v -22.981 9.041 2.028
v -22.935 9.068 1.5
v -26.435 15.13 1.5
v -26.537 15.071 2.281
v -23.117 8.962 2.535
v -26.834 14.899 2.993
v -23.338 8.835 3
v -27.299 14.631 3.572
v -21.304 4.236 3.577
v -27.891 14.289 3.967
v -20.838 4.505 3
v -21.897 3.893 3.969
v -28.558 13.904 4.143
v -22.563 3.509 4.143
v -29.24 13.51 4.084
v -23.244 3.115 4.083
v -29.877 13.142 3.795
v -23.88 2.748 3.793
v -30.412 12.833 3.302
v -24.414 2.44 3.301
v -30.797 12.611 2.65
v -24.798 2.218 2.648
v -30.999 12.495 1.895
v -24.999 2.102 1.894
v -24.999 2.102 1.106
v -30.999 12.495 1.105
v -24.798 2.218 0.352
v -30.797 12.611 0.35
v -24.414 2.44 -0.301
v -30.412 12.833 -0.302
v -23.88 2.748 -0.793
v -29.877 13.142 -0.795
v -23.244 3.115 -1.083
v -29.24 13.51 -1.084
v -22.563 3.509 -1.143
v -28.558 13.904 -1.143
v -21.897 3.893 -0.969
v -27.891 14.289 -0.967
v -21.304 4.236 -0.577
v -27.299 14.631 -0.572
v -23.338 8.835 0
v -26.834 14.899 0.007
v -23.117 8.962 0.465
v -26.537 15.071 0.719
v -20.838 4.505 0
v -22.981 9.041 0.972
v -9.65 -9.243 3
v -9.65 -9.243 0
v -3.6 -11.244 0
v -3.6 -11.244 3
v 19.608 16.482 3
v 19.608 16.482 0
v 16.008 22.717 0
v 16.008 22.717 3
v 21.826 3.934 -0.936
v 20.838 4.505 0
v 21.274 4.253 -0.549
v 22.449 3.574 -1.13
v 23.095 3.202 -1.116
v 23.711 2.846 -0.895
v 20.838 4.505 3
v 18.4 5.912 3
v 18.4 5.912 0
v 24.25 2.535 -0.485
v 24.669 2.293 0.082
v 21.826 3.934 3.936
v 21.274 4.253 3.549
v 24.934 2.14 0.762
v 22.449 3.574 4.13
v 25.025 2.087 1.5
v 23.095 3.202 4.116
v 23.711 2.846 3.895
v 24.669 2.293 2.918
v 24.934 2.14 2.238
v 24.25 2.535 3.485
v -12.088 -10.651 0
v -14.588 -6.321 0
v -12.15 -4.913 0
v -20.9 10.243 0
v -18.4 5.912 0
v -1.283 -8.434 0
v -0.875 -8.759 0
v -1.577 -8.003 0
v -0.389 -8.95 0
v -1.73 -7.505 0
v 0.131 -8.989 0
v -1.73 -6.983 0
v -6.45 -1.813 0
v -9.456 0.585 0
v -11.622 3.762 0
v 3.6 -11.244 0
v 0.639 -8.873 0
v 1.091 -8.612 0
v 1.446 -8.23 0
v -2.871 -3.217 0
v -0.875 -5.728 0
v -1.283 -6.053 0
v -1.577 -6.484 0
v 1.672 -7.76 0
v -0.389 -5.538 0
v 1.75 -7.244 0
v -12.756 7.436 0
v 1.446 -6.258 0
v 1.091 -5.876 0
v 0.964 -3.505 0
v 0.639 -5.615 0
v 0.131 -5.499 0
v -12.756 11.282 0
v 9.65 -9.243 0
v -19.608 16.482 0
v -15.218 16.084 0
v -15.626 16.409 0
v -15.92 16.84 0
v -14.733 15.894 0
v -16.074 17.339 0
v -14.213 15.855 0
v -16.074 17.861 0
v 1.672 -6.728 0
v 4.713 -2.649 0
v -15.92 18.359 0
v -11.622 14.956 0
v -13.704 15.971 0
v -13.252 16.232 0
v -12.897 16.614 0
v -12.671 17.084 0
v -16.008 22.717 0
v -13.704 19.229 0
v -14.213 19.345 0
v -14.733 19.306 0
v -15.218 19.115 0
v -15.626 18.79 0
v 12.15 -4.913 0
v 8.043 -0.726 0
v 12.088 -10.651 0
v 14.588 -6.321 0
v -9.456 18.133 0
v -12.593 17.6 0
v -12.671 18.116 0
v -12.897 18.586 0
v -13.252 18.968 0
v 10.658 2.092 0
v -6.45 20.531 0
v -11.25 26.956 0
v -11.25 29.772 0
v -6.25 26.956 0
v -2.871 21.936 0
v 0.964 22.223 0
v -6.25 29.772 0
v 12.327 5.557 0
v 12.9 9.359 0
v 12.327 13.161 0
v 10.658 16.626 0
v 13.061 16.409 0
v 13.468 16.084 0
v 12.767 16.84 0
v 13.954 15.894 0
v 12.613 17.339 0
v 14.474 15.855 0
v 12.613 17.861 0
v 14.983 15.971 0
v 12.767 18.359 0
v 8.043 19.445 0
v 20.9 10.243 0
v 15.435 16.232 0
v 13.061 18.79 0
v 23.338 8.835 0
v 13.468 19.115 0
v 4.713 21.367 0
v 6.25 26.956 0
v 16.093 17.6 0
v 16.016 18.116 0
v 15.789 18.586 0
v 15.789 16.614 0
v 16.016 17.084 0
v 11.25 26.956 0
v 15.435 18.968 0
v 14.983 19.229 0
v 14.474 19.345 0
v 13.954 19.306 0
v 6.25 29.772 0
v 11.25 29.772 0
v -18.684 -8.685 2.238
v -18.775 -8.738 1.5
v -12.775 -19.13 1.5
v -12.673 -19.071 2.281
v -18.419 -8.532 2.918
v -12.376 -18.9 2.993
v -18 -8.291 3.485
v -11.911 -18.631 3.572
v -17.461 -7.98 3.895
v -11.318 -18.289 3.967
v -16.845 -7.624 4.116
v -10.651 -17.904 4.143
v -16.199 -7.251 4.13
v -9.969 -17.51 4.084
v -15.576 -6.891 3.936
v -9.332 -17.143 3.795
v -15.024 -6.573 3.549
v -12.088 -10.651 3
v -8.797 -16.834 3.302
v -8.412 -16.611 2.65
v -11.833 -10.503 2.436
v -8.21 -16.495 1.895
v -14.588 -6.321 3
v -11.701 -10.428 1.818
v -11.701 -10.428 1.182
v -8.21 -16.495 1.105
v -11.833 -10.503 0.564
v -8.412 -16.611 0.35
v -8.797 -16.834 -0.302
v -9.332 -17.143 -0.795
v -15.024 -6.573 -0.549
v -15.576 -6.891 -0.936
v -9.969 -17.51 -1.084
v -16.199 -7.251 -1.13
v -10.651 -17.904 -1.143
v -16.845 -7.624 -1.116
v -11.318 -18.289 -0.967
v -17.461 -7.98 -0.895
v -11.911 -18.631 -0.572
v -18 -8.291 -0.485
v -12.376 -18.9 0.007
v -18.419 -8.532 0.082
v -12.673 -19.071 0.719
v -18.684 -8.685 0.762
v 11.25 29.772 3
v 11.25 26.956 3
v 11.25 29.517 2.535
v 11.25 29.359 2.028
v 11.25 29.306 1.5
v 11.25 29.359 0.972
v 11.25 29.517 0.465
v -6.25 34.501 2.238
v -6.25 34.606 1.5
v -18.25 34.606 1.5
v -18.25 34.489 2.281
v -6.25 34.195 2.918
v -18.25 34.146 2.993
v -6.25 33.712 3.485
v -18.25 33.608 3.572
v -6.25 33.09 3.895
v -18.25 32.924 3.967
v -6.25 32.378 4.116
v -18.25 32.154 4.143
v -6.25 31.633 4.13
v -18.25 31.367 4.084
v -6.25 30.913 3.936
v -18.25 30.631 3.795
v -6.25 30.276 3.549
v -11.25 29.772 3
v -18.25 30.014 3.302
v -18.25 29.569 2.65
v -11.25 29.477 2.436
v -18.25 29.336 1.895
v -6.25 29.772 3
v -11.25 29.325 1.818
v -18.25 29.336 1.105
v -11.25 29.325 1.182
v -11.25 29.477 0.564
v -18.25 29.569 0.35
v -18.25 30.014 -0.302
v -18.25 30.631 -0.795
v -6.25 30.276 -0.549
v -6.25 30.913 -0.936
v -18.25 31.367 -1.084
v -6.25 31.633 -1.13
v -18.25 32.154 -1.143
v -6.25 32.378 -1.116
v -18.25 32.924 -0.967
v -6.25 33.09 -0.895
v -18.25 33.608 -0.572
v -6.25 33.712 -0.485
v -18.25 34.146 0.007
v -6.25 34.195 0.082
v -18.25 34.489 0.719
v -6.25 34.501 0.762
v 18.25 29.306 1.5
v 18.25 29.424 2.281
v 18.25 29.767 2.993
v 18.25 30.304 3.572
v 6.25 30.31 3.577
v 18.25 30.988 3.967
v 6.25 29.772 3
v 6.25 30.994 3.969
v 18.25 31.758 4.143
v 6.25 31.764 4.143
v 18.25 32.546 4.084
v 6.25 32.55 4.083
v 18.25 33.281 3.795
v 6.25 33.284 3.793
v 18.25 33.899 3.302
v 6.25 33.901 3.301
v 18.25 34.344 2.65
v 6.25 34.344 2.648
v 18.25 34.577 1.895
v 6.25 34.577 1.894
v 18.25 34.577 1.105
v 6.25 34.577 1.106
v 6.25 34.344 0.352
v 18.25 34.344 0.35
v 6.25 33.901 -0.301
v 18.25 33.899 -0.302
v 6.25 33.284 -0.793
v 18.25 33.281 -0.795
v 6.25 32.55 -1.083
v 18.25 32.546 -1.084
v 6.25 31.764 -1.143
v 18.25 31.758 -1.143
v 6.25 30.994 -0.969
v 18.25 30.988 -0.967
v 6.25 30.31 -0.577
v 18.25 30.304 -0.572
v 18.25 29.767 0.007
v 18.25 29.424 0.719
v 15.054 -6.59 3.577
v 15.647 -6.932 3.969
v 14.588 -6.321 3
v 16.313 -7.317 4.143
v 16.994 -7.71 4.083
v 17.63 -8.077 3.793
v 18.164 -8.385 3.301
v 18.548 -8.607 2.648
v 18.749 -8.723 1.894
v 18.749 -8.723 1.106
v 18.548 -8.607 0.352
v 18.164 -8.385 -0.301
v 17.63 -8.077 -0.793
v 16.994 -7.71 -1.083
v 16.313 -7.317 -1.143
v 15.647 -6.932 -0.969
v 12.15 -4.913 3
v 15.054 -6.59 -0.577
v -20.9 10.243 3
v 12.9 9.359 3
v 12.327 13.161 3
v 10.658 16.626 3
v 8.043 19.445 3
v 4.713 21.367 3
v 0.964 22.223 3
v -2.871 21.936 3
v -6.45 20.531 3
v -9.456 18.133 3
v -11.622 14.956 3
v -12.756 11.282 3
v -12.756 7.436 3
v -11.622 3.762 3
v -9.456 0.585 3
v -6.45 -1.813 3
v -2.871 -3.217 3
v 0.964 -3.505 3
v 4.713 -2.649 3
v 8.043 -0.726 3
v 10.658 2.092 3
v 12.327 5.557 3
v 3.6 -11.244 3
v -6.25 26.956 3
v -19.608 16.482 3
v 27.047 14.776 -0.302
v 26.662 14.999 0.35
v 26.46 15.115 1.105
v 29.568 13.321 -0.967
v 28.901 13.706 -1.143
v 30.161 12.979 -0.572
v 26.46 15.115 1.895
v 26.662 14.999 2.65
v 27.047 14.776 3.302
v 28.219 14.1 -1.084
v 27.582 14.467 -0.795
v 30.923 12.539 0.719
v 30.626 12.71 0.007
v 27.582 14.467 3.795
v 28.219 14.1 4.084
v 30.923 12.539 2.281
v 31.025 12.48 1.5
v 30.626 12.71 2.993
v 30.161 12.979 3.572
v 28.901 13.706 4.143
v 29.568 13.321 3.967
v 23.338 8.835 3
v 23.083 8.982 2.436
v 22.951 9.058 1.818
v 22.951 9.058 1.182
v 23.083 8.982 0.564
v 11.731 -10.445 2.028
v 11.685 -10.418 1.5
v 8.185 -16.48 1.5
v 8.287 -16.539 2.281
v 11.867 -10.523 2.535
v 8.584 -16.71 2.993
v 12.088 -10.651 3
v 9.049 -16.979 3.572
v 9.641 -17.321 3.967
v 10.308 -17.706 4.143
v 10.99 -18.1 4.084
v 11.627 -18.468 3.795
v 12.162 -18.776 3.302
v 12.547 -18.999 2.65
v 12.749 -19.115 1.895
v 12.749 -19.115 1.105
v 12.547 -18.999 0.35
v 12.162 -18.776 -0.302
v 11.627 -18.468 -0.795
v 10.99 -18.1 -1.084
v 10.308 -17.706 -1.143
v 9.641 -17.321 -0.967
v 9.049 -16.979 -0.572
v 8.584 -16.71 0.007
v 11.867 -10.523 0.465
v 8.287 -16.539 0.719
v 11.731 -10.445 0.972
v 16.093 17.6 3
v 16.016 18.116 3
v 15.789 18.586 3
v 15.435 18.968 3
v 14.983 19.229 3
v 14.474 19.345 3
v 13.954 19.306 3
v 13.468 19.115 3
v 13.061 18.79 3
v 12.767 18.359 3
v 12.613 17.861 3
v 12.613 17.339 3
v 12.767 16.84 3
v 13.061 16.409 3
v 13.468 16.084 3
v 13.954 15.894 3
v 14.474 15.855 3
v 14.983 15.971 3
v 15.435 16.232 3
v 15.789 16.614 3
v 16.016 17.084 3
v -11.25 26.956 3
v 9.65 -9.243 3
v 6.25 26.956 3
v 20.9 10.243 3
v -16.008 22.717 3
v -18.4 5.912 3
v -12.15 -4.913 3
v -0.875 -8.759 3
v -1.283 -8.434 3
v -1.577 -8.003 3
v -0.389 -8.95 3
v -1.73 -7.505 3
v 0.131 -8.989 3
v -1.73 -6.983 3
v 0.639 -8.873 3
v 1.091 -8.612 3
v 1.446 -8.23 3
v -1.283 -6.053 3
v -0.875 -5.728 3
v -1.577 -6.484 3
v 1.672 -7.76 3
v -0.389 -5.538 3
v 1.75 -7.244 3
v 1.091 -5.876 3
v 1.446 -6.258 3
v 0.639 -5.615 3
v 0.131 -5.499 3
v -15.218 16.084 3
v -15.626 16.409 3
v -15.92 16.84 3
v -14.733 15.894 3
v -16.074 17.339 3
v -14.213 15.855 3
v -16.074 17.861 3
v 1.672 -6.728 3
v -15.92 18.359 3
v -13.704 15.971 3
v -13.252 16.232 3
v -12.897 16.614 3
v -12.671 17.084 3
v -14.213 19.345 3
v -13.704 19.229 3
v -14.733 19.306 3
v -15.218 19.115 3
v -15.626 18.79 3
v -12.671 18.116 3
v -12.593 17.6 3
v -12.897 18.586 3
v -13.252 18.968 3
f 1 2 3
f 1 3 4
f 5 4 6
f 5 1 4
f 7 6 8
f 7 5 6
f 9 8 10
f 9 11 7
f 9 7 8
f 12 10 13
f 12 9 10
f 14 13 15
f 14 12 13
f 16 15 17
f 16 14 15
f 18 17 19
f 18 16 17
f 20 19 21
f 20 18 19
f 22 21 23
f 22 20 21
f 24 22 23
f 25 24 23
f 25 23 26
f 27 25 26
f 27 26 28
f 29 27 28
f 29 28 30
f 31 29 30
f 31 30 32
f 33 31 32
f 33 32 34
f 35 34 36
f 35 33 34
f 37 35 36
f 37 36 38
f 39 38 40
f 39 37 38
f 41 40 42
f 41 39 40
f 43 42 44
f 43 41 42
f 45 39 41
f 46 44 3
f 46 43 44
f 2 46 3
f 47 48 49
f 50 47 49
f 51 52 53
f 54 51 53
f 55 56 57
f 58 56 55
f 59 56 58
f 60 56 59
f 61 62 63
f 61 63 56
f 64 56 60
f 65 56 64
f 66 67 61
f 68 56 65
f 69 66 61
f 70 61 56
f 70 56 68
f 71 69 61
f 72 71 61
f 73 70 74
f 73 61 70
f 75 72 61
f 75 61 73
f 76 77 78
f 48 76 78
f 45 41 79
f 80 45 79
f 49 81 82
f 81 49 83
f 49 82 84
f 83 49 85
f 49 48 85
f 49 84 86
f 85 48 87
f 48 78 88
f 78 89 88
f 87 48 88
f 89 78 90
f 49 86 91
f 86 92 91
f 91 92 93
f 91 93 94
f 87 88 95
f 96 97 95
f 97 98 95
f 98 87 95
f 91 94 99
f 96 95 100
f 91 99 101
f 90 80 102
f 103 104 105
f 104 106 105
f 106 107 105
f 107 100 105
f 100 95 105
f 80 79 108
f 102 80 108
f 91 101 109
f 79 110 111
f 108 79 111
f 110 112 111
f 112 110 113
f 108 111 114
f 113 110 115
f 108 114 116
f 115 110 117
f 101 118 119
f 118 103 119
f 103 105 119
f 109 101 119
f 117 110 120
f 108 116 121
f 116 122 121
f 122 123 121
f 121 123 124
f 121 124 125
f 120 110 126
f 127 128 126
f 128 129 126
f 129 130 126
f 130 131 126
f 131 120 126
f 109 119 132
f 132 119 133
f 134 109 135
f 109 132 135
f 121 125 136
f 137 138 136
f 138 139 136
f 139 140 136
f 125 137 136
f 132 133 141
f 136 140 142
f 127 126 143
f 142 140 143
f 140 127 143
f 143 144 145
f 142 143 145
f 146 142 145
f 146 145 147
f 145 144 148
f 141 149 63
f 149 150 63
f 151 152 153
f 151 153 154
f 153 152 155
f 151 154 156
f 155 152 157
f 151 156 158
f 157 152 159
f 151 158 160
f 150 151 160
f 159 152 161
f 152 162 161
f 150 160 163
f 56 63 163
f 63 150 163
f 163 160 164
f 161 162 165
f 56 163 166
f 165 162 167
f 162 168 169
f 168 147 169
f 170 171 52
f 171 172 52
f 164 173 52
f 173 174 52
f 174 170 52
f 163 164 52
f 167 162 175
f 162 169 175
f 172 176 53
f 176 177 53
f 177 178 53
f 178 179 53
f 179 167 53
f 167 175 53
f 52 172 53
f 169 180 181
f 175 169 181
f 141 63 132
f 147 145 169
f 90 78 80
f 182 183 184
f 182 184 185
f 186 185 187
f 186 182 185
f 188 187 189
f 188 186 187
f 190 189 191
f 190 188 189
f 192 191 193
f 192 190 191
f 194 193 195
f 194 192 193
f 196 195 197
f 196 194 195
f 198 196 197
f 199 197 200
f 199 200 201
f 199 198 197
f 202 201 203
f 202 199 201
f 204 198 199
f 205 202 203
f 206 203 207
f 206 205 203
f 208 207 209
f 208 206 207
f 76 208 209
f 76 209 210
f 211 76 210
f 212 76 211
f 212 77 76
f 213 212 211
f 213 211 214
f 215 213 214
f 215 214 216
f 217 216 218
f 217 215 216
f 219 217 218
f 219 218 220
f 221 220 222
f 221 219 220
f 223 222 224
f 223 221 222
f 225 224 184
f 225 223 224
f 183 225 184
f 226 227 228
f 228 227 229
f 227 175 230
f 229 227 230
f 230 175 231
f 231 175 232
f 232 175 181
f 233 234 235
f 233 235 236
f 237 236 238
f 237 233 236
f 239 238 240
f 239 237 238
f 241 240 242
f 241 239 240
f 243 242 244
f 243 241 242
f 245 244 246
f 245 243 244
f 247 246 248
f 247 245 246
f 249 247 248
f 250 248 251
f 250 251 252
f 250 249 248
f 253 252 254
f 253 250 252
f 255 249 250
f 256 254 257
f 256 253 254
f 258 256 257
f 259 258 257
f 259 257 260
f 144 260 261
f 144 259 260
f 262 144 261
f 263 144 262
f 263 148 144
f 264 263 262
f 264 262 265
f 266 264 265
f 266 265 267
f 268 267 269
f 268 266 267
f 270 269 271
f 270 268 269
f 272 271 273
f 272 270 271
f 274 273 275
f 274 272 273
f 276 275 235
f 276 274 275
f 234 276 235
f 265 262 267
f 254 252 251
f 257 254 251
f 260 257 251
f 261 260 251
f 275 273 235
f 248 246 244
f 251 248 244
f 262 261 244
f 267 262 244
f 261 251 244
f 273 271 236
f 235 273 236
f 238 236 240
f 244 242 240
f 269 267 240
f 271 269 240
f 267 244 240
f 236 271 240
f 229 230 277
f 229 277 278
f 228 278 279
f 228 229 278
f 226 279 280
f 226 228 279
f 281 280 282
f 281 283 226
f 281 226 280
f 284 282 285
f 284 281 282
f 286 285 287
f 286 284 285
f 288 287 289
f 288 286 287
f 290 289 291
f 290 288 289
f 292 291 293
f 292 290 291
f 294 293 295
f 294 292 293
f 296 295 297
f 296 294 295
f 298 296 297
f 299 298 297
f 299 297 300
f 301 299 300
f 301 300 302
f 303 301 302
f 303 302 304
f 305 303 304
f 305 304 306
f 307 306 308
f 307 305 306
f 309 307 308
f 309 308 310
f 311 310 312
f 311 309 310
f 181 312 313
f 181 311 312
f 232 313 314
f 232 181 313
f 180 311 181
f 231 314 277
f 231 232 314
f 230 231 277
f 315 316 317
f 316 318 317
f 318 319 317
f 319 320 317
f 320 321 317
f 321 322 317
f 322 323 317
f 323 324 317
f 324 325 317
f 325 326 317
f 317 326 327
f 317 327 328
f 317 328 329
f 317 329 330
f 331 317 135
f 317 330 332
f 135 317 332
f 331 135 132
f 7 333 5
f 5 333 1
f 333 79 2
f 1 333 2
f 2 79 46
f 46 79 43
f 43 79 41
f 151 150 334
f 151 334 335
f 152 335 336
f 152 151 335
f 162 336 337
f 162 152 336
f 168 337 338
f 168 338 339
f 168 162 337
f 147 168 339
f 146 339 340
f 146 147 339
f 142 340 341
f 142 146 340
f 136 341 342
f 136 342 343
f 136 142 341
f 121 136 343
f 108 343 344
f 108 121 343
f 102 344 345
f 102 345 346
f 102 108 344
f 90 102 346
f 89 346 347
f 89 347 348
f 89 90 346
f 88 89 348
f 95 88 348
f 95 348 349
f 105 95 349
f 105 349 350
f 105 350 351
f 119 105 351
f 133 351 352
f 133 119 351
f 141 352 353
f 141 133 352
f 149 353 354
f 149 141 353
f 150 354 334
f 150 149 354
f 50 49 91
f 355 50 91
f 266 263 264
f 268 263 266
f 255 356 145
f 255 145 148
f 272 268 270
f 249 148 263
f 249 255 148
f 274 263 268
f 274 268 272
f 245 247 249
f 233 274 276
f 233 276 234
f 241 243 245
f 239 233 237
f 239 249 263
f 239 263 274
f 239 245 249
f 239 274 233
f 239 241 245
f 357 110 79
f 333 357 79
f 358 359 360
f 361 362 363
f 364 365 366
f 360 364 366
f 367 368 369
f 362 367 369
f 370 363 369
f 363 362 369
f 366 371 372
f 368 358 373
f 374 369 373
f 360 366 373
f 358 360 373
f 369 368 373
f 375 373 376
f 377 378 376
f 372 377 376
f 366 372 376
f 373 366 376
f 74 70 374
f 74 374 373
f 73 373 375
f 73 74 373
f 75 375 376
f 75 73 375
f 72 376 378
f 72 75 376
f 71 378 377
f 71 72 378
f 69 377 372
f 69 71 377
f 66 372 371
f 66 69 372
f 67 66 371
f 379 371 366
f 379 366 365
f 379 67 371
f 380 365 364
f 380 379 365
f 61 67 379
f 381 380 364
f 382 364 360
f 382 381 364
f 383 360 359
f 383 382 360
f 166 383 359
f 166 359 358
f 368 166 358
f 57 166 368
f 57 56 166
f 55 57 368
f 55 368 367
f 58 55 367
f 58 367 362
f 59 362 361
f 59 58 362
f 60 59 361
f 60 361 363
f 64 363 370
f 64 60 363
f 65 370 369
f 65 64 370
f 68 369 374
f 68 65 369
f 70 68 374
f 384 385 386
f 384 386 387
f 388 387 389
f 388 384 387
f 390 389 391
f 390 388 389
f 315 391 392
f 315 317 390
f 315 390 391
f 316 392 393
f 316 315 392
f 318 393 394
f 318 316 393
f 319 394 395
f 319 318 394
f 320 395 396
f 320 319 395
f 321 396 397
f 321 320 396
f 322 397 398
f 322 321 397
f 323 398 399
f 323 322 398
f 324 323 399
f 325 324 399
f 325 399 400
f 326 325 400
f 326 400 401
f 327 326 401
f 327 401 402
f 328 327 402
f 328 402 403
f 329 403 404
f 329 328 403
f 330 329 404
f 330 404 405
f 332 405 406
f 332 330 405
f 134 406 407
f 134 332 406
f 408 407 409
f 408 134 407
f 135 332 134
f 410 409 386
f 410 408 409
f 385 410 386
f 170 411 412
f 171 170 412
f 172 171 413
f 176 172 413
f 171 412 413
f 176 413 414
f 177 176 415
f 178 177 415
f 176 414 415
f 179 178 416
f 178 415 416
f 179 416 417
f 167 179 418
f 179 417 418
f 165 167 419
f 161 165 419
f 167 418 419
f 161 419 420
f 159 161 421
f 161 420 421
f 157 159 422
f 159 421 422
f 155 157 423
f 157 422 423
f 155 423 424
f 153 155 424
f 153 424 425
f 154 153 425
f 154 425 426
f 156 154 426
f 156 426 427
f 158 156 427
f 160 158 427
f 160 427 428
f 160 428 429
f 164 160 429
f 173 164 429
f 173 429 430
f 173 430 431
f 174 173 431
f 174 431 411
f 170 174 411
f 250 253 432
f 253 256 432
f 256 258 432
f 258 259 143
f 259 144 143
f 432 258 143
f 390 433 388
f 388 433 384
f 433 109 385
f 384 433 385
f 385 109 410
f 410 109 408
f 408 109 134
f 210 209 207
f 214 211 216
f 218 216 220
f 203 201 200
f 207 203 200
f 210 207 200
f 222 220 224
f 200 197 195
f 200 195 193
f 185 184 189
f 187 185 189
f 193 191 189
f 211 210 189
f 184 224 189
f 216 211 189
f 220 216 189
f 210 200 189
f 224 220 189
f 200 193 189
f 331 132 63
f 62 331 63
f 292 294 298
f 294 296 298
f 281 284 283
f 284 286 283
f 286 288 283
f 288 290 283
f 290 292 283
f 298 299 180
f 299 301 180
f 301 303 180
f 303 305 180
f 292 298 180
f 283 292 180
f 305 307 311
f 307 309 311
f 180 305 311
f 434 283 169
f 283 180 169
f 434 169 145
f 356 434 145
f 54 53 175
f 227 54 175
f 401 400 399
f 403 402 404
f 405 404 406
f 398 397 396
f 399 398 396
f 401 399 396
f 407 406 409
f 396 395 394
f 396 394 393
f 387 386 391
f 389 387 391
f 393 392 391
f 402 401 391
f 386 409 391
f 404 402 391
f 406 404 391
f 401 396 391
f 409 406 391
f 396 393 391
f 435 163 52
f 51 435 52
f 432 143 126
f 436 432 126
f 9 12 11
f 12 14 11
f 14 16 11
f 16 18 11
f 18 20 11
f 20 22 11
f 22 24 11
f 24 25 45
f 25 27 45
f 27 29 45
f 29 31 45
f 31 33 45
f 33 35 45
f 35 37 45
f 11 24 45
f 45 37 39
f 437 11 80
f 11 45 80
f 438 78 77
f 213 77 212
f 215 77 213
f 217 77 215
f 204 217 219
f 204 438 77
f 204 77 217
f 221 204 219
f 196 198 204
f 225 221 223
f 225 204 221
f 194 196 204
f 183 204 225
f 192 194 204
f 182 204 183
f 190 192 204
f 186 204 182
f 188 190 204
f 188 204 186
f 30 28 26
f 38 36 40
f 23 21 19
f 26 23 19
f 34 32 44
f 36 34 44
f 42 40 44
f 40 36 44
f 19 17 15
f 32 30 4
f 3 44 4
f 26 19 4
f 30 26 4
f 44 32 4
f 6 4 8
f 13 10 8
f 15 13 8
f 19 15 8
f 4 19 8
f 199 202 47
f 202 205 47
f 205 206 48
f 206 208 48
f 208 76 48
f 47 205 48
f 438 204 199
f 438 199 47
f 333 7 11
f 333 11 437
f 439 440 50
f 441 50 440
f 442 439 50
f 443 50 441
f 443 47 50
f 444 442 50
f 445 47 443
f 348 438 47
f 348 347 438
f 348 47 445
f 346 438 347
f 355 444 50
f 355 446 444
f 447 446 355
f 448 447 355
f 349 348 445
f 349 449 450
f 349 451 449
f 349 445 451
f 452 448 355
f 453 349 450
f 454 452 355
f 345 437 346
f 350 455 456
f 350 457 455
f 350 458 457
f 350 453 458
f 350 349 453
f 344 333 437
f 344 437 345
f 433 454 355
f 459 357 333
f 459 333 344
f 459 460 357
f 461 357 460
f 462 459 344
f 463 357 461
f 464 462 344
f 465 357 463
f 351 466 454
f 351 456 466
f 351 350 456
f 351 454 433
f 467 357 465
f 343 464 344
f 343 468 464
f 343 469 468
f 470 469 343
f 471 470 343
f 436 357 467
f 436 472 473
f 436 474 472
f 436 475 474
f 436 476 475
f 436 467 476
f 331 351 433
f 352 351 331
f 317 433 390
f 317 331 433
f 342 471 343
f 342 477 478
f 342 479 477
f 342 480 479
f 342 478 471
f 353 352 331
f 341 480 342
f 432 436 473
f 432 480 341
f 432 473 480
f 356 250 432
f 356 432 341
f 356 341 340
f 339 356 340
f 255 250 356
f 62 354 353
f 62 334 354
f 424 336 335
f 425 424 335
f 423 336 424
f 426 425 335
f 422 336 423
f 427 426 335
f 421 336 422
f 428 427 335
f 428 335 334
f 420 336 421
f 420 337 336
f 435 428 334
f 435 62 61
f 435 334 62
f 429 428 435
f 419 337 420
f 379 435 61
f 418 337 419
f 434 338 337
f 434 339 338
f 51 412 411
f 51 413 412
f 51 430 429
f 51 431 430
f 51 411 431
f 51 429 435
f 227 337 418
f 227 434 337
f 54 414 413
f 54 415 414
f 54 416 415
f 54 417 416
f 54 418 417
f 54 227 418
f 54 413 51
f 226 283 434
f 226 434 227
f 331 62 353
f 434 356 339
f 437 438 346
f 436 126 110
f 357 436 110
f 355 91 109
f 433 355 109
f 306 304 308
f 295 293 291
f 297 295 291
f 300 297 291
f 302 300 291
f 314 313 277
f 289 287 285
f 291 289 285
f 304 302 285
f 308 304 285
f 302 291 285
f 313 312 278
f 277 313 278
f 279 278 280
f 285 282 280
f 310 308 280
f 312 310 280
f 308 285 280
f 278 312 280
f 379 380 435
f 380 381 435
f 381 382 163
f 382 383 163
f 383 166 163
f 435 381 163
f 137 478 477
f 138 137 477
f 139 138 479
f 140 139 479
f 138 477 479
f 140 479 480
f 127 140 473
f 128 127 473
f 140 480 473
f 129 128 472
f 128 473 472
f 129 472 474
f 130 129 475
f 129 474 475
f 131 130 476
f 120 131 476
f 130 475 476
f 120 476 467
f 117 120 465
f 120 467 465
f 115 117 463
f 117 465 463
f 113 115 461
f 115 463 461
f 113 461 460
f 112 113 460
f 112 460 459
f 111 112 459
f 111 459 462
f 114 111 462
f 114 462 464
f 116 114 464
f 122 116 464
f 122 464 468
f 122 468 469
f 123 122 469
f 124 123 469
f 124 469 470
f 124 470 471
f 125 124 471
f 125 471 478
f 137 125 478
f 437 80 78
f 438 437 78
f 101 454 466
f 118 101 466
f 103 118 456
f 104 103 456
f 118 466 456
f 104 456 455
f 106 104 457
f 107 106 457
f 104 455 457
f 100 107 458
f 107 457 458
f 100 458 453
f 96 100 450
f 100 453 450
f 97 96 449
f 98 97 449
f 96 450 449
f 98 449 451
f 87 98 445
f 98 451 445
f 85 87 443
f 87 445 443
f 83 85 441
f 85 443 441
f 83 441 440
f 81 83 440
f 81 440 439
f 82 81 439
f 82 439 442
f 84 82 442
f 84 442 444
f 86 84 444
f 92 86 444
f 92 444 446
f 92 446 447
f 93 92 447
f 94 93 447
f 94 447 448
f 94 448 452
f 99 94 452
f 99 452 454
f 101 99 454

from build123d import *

# Parameters (mm, degrees)
F0_R      = 12.9
F1_DEPTH  = 3
F2_R      = 1.75
F3_DEPTH  = 3.001
F4_R      = 2.65
F5_DEPTH  = 12
F6_R      = 2.65
F7_DEPTH  = 12
F8_R      = 2.65
F9_DEPTH  = 12
F10_R     = 2.65
F11_DEPTH = 12
F12_R     = 2.65
F13_DEPTH = 12
F14_R     = 2.65
F15_DEPTH = 12


with BuildPart() as f1:
    # F0 (on Top) → F1 (new body)
    with BuildSketch(Plane.XY):
        Polygon((16.0075136901, 22.7174561645), (11.25, 26.956246243), (11.25, 31.956246243), (6.25, 31.956246243), (6.25, 26.956246243), (-6.25, 26.956246243), (-6.25, 31.956246243), (-11.25, 31.956246243), (-11.25, 26.956246243), (-16.0075136901, 22.7174561645), (-19.6075136901, 16.4820732572), (-20.8996567344, 10.2425505034), (-25.2297837534, 7.7425505034), (-22.7297837534, 3.4124234845), (-18.3996567344, 5.9124234845), (-12.1496567344, -4.9128940628), (-16.4797837534, -7.4128940628), (-13.9797837534, -11.7430210817), (-9.6496567344, -9.2430210817), (-3.6, -11.243753757), (3.6, -11.243753757), (9.6497229346, -9.2429064231), (13.9797837534, -11.7430210817), (16.4797837534, -7.4128940628), (12.1496567344, -4.9128940628), (18.3996567344, 5.9124234845), (22.7297837534, 3.4124234845), (25.2297837534, 7.7425505034), (20.8996567344, 10.2425505034), (19.6075136901, 16.4820732572), align=None)
        with Locations((0, 9.3591320669)):
            Circle(F0_R, mode=Mode.SUBTRACT)
    extrude(amount=F1_DEPTH)

    # F2 (on face) → F3 (cut, through all)
    with BuildSketch(Plane.XY.offset(3)):
        with Locations((-14.343412075, 17.5997647108)):
            Circle(F2_R)
        with Locations((14.343412075, 17.5997647108)):
            Circle(F2_R)
        with Locations((0, -7.243753757)):
            Circle(F2_R)
    extrude(amount=-F3_DEPTH, mode=Mode.SUBTRACT)

    # F4 (on face) → F5 (join)
    with BuildSketch(Plane(origin=(6.25, 0, 0), x_dir=(0, -1, 0), z_dir=(-1, 0, 0))):
        with Locations((-31.956246243, 1.5)):
            Circle(F4_R)
    extrude(amount=-F5_DEPTH)

    # F6 (on face) → F7 (join)
    with BuildSketch(Plane.YZ.offset(-6.25)):
        with Locations((31.956246243, 1.5)):
            Circle(F6_R)
    extrude(amount=-F7_DEPTH)

    # F8 (on face) → F9 (join)
    with BuildSketch(Plane(origin=(-7.1600686514, 12.4016026898, 0), x_dir=(0.8660254038, 0.5, 0), z_dir=(0.5, -0.8660254038, 0))):
        with Locations((-17.9783584107, 1.5)):
            Circle(F8_R)
    extrude(amount=-F9_DEPTH)

    # F10 (on face) → F11 (join)
    with BuildSketch(Plane(origin=(-0.9100686514, 1.5762851425, 0), x_dir=(-0.8660254038, -0.5, 0), z_dir=(-0.5, 0.8660254038, 0))):
        with Locations((17.9783584107, 1.5)):
            Circle(F10_R)
    extrude(amount=-F11_DEPTH)

    # F12 (on face) → F13 (join)
    with BuildSketch(Plane(origin=(0.9100686514, 1.5762851425, 0), x_dir=(-0.8660254038, 0.5, 0), z_dir=(0.5, 0.8660254038, 0))):
        with Locations((-17.9783584107, 1.5)):
            Circle(F12_R)
    extrude(amount=-F13_DEPTH)

    # F14 (on face) → F15 (join)
    with BuildSketch(Plane(origin=(7.1600686514, 12.4016026898, 0), x_dir=(0.8660254038, -0.5, 0), z_dir=(-0.5, -0.8660254038, 0))):
        with Locations((17.9783584107, 1.5)):
            Circle(F14_R)
    extrude(amount=-F15_DEPTH)


solid = f1.part
